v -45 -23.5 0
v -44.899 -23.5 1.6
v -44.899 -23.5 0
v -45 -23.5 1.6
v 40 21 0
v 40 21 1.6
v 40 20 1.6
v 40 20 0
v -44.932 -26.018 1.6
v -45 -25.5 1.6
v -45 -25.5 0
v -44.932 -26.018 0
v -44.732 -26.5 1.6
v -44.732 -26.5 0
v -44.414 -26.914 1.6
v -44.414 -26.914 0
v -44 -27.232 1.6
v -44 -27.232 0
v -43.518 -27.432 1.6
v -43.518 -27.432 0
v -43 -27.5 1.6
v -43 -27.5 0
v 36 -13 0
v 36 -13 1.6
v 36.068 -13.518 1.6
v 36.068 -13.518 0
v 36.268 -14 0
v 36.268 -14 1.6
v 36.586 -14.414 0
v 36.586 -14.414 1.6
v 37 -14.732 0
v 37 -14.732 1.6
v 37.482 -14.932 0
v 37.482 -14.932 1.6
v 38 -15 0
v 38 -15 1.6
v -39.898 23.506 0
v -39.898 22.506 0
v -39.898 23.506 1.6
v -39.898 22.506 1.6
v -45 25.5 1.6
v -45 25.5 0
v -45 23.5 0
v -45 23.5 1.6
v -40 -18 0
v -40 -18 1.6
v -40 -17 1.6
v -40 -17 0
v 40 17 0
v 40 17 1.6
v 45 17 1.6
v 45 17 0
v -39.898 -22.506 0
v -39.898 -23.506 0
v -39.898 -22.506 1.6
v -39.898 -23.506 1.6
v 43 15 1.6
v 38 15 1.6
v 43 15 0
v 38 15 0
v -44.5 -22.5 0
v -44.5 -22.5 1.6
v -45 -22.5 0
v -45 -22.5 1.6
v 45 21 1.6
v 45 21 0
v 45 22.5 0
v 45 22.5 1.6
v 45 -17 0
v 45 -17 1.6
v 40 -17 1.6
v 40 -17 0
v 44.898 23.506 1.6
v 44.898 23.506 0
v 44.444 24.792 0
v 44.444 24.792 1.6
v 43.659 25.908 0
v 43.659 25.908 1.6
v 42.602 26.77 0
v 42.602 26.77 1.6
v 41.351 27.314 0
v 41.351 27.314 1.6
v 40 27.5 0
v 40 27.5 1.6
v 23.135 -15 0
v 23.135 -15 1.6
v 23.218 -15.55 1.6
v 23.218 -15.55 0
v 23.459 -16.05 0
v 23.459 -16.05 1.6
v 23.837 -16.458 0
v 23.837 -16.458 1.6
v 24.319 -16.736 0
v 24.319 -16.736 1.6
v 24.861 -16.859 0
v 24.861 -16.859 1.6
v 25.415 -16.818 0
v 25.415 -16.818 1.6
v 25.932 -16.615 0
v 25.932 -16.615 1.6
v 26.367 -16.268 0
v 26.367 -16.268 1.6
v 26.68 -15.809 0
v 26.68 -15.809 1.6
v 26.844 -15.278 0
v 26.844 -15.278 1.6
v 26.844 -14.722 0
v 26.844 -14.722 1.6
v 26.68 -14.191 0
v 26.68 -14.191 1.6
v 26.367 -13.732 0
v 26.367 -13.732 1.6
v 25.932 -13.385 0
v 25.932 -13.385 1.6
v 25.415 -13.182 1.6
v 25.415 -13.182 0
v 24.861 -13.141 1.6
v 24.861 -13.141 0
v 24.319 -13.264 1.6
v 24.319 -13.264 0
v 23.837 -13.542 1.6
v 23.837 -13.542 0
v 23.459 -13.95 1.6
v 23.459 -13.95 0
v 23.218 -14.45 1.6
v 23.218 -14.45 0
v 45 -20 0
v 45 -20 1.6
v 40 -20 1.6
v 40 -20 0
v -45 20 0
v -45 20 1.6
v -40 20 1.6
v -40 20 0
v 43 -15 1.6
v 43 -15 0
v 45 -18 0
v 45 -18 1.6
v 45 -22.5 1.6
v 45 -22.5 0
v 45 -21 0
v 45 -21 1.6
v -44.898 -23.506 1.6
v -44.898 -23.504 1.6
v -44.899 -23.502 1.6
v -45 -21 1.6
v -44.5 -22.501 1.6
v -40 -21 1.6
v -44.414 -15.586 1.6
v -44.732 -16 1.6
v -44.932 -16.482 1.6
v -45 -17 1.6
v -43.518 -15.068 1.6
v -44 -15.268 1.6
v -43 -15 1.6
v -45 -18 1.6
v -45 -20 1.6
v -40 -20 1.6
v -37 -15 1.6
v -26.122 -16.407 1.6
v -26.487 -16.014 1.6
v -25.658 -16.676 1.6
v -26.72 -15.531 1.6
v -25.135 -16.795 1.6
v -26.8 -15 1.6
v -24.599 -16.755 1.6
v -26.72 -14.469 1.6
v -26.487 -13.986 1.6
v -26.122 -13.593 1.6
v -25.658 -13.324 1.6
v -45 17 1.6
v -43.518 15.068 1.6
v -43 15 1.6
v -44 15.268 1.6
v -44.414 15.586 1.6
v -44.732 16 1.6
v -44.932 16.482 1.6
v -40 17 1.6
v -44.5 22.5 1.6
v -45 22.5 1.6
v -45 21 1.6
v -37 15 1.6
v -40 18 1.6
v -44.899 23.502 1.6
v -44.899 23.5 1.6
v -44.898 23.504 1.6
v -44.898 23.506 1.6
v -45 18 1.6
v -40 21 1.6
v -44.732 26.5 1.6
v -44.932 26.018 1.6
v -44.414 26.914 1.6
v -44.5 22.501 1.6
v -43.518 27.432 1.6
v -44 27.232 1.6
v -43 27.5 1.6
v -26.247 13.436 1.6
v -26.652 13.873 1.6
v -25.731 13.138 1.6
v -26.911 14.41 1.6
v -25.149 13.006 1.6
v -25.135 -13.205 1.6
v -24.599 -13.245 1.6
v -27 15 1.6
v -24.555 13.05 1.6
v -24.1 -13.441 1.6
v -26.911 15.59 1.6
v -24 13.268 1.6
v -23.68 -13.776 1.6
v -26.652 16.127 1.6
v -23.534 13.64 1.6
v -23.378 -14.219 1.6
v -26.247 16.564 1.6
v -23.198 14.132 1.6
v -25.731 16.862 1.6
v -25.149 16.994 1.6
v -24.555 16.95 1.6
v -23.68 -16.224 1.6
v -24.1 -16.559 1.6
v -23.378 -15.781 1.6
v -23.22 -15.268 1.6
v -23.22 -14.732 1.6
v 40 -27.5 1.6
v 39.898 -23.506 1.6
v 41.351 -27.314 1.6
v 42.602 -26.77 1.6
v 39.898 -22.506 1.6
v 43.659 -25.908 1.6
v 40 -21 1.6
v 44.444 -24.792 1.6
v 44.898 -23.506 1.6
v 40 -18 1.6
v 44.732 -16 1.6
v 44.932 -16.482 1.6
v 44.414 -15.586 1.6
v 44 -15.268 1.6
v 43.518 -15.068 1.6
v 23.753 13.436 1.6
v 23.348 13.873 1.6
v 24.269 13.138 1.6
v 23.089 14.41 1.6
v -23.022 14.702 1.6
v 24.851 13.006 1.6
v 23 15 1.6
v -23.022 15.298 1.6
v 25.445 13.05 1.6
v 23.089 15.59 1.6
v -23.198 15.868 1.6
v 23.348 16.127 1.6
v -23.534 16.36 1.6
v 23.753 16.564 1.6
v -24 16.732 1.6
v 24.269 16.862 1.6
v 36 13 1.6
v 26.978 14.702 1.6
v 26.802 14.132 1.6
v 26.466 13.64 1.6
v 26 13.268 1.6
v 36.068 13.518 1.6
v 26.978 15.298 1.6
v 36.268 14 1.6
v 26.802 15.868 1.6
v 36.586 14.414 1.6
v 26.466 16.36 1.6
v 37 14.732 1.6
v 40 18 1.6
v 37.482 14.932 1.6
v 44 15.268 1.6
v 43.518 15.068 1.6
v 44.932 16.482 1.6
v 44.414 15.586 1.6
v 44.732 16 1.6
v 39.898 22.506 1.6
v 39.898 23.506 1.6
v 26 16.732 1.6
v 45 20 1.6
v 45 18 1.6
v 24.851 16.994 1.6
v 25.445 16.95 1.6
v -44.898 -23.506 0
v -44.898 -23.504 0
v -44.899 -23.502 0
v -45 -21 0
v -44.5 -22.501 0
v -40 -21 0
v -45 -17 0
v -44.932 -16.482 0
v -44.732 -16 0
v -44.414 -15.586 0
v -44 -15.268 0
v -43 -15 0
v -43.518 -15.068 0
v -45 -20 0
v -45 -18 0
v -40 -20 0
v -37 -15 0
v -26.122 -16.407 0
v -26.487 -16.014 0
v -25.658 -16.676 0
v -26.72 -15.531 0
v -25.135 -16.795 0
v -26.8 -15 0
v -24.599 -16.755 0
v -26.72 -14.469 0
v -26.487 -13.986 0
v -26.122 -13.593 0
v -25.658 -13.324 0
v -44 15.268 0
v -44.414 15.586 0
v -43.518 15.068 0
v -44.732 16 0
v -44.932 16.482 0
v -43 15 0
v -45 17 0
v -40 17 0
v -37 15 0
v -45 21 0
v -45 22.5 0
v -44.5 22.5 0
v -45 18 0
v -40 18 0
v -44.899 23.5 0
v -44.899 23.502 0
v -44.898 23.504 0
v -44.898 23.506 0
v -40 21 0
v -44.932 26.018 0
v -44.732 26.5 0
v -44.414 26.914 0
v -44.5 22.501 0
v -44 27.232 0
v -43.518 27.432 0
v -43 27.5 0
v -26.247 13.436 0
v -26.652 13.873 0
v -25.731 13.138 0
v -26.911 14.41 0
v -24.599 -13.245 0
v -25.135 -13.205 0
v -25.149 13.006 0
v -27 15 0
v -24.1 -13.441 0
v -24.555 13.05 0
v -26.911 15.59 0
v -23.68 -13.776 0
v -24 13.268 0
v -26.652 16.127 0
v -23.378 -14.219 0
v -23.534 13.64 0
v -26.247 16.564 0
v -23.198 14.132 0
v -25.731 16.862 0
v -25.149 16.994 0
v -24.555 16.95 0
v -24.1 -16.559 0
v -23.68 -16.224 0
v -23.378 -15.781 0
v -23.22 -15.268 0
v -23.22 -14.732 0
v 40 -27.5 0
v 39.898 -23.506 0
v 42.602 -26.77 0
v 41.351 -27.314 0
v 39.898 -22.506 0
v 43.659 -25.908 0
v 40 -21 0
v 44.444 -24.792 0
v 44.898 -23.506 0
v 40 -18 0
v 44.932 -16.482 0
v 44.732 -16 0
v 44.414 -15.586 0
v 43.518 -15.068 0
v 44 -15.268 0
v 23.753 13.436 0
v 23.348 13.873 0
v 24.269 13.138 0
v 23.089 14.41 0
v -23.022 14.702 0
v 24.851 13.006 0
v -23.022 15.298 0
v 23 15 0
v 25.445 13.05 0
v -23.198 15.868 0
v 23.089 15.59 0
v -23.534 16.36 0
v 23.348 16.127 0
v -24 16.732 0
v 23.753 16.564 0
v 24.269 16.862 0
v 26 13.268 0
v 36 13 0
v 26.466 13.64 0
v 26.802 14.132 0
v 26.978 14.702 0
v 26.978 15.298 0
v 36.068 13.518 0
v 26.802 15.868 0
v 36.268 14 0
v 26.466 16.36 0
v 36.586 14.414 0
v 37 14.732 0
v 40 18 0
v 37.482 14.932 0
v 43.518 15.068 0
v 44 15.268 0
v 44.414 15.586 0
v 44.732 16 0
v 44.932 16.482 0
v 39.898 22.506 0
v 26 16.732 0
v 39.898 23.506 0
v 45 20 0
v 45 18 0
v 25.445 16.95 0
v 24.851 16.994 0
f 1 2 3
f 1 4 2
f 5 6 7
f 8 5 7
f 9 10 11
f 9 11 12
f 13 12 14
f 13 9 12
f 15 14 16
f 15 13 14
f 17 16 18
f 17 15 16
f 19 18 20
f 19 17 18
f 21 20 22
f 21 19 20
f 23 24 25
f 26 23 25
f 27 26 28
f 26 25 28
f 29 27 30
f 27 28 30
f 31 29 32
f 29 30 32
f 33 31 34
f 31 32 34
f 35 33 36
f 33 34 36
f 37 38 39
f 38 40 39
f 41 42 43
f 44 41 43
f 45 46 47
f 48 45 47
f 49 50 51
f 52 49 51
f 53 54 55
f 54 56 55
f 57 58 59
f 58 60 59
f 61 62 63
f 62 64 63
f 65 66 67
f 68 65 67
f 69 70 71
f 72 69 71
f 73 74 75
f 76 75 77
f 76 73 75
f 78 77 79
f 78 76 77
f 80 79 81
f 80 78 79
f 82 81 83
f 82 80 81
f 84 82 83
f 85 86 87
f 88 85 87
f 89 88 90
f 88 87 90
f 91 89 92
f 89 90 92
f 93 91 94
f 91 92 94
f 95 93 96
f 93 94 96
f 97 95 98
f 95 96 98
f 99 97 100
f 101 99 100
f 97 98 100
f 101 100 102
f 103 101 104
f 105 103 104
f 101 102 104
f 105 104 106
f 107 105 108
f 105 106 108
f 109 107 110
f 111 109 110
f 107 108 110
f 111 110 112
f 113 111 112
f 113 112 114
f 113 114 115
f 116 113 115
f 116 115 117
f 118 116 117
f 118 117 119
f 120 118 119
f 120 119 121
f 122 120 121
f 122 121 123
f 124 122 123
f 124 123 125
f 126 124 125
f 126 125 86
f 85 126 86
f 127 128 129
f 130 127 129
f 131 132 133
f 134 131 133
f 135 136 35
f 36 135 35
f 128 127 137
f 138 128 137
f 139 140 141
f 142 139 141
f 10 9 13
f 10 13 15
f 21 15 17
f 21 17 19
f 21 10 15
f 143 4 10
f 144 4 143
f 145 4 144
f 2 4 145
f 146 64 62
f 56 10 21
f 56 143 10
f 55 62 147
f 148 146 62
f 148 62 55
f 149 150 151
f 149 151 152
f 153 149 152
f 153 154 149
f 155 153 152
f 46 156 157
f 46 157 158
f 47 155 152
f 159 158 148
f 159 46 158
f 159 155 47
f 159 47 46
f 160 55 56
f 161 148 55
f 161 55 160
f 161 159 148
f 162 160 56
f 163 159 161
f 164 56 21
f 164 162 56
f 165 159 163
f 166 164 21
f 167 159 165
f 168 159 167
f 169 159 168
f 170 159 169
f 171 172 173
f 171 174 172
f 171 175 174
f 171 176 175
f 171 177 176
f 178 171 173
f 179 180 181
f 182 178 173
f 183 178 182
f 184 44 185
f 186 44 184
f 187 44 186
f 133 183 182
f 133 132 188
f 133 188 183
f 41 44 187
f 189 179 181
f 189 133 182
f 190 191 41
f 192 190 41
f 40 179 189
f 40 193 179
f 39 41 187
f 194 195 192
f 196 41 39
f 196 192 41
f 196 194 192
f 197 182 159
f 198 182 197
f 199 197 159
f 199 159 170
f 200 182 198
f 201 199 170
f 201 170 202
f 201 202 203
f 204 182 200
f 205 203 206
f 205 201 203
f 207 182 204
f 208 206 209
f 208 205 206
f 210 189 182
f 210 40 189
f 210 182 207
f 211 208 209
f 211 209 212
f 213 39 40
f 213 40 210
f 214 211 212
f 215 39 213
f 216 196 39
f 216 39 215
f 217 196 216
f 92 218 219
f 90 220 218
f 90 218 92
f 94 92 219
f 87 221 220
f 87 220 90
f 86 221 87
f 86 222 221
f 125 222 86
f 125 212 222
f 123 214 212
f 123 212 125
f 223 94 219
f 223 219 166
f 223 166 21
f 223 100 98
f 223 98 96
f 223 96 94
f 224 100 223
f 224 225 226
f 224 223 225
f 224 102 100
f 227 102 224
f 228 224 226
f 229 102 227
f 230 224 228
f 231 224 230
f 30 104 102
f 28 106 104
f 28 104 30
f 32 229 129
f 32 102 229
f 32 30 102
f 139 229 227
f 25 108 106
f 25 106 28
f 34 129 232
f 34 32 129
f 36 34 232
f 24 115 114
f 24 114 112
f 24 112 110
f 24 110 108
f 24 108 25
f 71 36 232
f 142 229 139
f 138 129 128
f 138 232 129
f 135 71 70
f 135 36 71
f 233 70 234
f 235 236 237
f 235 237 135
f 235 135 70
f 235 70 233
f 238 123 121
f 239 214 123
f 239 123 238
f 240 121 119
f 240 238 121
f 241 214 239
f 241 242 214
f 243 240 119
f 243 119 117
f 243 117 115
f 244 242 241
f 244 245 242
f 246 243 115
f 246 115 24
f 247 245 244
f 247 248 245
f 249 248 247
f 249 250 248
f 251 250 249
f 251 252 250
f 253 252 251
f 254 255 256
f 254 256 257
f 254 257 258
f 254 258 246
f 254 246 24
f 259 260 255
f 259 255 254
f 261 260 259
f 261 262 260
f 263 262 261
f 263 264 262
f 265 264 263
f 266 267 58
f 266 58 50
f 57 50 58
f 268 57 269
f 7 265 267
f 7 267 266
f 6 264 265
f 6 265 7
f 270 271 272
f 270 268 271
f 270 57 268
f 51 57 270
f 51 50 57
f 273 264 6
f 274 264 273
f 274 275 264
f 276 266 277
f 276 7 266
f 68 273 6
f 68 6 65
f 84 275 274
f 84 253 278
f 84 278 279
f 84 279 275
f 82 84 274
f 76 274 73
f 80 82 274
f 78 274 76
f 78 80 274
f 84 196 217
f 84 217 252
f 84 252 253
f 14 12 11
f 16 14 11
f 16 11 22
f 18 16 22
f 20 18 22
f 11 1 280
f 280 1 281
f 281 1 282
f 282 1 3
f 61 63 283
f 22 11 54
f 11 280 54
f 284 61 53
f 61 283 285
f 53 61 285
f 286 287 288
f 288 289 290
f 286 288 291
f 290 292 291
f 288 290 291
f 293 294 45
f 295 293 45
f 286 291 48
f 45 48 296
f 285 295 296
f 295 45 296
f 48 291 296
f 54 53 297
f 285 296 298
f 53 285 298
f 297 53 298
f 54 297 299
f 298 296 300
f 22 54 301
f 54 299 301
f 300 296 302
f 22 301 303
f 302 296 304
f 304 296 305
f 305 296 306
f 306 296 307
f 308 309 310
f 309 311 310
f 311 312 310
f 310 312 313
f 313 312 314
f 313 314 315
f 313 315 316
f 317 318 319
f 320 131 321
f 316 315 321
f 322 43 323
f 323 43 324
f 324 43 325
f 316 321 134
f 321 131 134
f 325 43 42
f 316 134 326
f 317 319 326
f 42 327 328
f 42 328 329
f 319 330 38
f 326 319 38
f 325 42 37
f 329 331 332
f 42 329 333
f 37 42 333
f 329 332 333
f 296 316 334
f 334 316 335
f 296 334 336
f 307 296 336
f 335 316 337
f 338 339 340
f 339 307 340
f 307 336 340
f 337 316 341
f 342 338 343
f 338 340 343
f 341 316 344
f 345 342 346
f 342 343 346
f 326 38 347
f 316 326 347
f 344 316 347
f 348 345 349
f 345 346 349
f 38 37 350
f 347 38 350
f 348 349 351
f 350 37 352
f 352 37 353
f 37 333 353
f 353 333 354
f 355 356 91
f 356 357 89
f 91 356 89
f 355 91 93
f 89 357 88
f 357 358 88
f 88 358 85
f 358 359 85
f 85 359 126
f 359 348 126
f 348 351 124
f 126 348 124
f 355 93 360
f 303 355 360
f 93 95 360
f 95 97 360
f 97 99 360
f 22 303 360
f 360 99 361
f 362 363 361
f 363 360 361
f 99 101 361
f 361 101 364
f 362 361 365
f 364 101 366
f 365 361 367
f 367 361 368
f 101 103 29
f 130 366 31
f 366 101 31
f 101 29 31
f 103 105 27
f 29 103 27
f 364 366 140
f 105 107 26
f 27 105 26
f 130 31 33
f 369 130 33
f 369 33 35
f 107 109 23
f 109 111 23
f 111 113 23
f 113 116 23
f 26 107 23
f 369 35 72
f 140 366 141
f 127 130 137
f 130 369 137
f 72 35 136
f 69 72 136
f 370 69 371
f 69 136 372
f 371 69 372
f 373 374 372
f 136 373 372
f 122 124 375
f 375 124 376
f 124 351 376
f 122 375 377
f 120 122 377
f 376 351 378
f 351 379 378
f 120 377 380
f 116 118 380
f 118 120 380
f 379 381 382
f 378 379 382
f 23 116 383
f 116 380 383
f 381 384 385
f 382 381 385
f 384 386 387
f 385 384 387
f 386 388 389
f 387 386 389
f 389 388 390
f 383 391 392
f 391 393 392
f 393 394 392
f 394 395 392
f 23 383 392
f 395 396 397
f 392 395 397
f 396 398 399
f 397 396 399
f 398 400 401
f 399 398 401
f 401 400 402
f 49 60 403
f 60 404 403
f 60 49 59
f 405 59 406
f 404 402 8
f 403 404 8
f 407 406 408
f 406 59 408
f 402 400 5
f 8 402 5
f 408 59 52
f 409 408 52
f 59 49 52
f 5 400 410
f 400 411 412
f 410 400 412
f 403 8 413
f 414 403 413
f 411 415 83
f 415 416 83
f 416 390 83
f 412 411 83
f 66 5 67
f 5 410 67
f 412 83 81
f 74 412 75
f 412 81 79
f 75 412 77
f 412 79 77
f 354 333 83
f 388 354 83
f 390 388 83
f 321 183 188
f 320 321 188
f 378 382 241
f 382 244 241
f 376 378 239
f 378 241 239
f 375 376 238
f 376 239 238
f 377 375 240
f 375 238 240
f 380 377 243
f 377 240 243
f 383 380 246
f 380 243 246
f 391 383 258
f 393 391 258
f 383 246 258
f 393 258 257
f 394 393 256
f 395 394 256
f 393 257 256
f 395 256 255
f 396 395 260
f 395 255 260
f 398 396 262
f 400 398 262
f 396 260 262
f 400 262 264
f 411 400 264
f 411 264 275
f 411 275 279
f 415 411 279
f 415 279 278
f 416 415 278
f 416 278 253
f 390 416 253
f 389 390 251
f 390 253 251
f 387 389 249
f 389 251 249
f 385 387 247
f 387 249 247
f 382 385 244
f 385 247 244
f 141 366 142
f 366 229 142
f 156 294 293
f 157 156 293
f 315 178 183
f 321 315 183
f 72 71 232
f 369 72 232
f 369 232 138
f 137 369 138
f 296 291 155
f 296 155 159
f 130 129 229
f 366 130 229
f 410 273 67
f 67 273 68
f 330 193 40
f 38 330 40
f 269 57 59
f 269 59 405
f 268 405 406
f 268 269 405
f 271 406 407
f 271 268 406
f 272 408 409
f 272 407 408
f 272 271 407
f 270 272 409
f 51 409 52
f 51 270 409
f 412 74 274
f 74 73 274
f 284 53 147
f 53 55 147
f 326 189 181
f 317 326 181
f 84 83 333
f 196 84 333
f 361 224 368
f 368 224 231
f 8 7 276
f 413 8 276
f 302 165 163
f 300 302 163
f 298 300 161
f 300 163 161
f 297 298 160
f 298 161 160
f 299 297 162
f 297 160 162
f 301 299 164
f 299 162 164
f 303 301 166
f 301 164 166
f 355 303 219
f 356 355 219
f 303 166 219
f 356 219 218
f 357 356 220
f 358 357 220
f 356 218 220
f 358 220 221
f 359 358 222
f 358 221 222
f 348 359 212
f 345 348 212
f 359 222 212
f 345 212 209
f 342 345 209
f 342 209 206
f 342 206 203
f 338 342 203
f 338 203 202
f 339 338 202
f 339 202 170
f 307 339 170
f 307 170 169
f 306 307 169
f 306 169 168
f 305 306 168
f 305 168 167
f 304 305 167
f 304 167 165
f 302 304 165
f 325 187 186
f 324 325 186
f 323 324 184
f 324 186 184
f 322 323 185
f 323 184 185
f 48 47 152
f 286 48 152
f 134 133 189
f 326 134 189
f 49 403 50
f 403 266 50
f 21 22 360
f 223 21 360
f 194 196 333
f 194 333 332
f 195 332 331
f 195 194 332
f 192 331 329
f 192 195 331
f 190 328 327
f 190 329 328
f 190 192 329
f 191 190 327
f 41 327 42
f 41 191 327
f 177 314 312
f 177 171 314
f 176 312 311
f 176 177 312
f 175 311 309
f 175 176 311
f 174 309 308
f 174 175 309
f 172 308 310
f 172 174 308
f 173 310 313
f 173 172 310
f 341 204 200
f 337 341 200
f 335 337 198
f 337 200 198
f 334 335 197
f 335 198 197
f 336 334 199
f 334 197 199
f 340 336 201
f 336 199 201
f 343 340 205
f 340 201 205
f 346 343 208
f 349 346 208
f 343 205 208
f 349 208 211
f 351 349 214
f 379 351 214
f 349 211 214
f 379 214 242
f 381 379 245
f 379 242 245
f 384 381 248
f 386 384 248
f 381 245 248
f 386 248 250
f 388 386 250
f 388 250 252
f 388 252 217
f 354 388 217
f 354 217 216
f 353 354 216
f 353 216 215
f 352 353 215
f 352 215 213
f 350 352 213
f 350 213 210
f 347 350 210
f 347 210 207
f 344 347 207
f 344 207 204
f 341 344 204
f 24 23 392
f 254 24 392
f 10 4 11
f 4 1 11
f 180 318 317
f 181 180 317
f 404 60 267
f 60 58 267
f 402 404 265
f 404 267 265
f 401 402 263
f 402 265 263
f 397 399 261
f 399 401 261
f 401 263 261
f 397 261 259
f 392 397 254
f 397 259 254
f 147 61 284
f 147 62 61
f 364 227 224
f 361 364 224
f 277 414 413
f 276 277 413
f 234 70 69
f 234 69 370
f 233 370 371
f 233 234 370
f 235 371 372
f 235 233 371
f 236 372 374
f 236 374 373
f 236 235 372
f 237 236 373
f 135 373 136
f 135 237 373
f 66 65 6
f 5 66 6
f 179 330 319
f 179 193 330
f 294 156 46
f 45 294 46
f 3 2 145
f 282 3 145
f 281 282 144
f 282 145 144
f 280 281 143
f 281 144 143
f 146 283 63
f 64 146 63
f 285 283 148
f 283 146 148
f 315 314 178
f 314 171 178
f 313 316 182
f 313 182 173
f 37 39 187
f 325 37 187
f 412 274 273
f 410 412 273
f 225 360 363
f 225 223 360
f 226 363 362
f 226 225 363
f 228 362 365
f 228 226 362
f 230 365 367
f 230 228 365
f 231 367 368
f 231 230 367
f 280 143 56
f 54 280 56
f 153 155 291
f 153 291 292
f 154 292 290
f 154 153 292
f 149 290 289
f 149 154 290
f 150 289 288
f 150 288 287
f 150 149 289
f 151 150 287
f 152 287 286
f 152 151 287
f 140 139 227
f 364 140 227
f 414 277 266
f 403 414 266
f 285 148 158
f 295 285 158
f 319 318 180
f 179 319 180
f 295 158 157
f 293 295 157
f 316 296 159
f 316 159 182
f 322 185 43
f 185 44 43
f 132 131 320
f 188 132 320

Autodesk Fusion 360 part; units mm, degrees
sketch "Sketch1" plane through (0, 0, 0) normal (0, 0, 1) x (1, 0, 0)
  line L0 (45, 27.5) -> (-45, 27.5)
  line L1 (-45, 27.5) -> (-45, -27.5)
  line L2 (-45, -27.5) -> (45, -27.5)
  line L3 (45, -27.5) -> (45, 27.5)
  line L4 (45, 27.5) -> (-45, -27.5) construction
  line L5 (-45, 27.5) -> (45, -27.5) construction
  dimension "d1" = 90
  dimension "d2" = 55
extrude "Extrude1" add sketch "Sketch1" along normal blind 1.6
fillet "Fillet1" radius 5 2 edges at (45, -27.5, 0.8) (45, 27.5, 0.8)
sketch "Sketch2" plane through (0, 0, 1.6) normal (0, 0, 1) x (-1, 0, 0)
  line L0 (45, -27.5) -> (45, 27.5)
  line L1 (45, 27.5) -> (-40, 27.5)
  arc A0 (-40, 27.5) -> (-45, 22.5) centre (-40, 22.5) ccw
  line L2 (-45, 22.5) -> (-45, -22.5)
  arc A1 (-45, -22.5) -> (-40, -27.5) centre (-40, -22.5) ccw
  line L3 (-40, -27.5) -> (45, -27.5)
  line L4 (25, 15) -> (-25, 15) construction
  line L5 (-25, 15) -> (-25, -15)
  line L6 (-25, -15) -> (25, -15) construction
  line L7 (25, -15) -> (25, 15)
  line L8 (25, 15) -> (-25, -15) construction
  line L9 (-25, 15) -> (25, -15) construction
  circle A2 centre (25, -15) radius 2
  circle A3 centre (25, 15) radius 1.8001
  circle A4 centre (-25, 15) radius 1.8646
  circle A5 centre (-25, -15) radius 2
  dimension "d10" = 50
  dimension "d11" = 30
extrude "Extrude2" cut sketch "Sketch2" against normal blind 4 contours A5 | A4 | A3 | A2
sketch "Sketch3" plane through (0, 0, 0) normal (0, 0, -1) x (1, 0, 0)
  circle A0 centre (25, -15) radius 2
  circle A1 centre (25, 15) radius 1.8646
  circle A2 centre (-25, -15) radius 2
  circle A3 centre (-25, 15) radius 1.8001
  line L0 (-45, -27.5) -> (40, -27.5)
  arc A4 (40, -27.5) -> (45, -22.5) centre (40, -22.5) ccw
  line L1 (45, -22.5) -> (45, 22.5)
  arc A5 (45, 22.5) -> (40, 27.5) centre (40, 22.5) ccw
  line L2 (40, 27.5) -> (-45, 27.5)
  line L3 (-45, 27.5) -> (-45, -27.5)
  line L4 (-45, 15) -> (-37, 15)
  line L5 (-37, 15) -> (-37, -15)
  line L6 (-37, -15) -> (-45, -15)
  line L7 (-45, -15) -> (-45, 15)
extrude "Extrude3" cut sketch "Sketch3" against normal blind 3 contours L3 L4 L5 L6 L7
sketch "Sketch4" plane through (0, 0, 0) normal (0, 0, -1) x (1, 0, 0)
  line L0 (-37, -15) -> (-45, -15)
  line L1 (-45, -27.5) -> (40, -27.5)
  arc A0 (40, -27.5) -> (45, -22.5) centre (40, -22.5) ccw
  line L2 (45, -22.5) -> (45, 22.5)
  arc A1 (45, 22.5) -> (40, 27.5) centre (40, 22.5) ccw
  line L3 (40, 27.5) -> (-45, 27.5)
  line L4 (-45, 15) -> (-37, 15)
  line L5 (-37, 15) -> (-37, -15)
  circle A2 centre (25, -15) radius 2
  circle A3 centre (25, 15) radius 1.8646
  circle A4 centre (-25, -15) radius 2
  circle A5 centre (-25, 15) radius 1.8001
  line L6 (45, 15) -> (36, 15)
  line L7 (36, 15) -> (36, -15)
  line L8 (36, -15) -> (45, -15)
  line L9 (45, -15) -> (45, 15)
  line L10 (-45, -15) -> (-45, -27.5)
  line L11 (-45, 27.5) -> (-45, 15)
extrude "Extrude4" cut sketch "Sketch4" against normal blind 6 contours L2 L6 L7 L8 L9
sketch "Sketch5" plane through (0, 0, 1.6) normal (0, 0, 1) x (-1, 0, 0)
  circle A0 centre (25, 15) radius 1.8001
  circle A1 centre (25, -15) radius 2
  circle A2 centre (-25, 15) radius 1.8646
  circle A3 centre (-25, -15) radius 2
  line L0 (45, -15) -> (37, -15)
  line L1 (37, -15) -> (37, 15)
  line L2 (37, 15) -> (45, 15)
  line L3 (45, 27.5) -> (-40, 27.5)
  arc A4 (-40, 27.5) -> (-45, 22.5) centre (-40, 22.5) ccw
  line L4 (-45, -15) -> (-45, -22.5)
  line L5 (-45, 15) -> (-36, 15)
  line L6 (-36, 15) -> (-36, -15)
  line L7 (-36, -15) -> (-45, -15)
  arc A5 (-45, -22.5) -> (-40, -27.5) centre (-40, -22.5) ccw
  line L8 (-40, -27.5) -> (45, -27.5)
  line L9 (-44.8978, -23.5058) -> (-39.8978, -23.5058)
  line L10 (-39.8978, -23.5058) -> (-39.8978, -22.5058)
  line L11 (-39.8978, -22.5058) -> (-45, -22.5)
  line L12 (-45, -21) -> (-40, -21)
  line L13 (-40, -21) -> (-40, -20)
  line L14 (-40, -20) -> (-45, -20)
  line L15 (-45, -18) -> (-40, -18)
  line L16 (-40, -18) -> (-40, -17)
  line L17 (-40, -17) -> (-45, -17)
  line L18 (45, -27.5) -> (45, -15)
  line L19 (45, 15) -> (45, 27.5)
  line L20 (-45, 22.5) -> (-45, 15)
  dimension "d20" = 5
  dimension "d21" = 1
  dimension "d22" = 1
  dimension "d23" = 1
extrude "Extrude5" cut sketch "Sketch5" against normal blind 3 contours A5 L9 L10 L11 | L4 L12 L13 L14 | L4 L15 L16 L17
mirror "Mirror1" about plane through (0, 0, 0) normal (0, 1, 0) of "Extrude5"
sketch "Sketch6" plane through (0, 0, 1.6) normal (0, 0, 1) x (-1, 0, 0)
  circle A0 centre (-25, -15) radius 2
  circle A1 centre (-25, 15) radius 1.8646
  circle A2 centre (25, -15) radius 2
  circle A3 centre (25, 15) radius 1.8001
  line L0 (-44.8978, 23.5058) -> (-39.8978, 23.5058)
  line L1 (-39.8978, 23.5058) -> (-39.8978, 22.5058)
  line L2 (-39.8978, 22.5058) -> (-45, 22.5)
  line L3 (-45, 22.5) -> (-45, 21)
  line L4 (-45, 21) -> (-40, 21)
  line L5 (-40, 21) -> (-40, 20)
  line L6 (-40, 20) -> (-45, 20)
  line L7 (-45, 20) -> (-45, 18)
  line L8 (-45, 18) -> (-40, 18)
  line L9 (-40, 18) -> (-40, 17)
  line L10 (-40, 17) -> (-45, 17)
  line L11 (-45, 15) -> (-36, 15)
  line L12 (-36, 15) -> (-36, -15)
  line L13 (-36, -15) -> (-45, -15)
  line L14 (-45, -17) -> (-40, -17)
  line L15 (-40, -17) -> (-40, -18)
  line L16 (-40, -18) -> (-45, -18)
  line L17 (-45, -18) -> (-45, -20)
  line L18 (-45, -20) -> (-40, -20)
  line L19 (-40, -20) -> (-40, -21)
  line L20 (-40, -21) -> (-45, -21)
  line L21 (-45, -21) -> (-45, -22.5)
  line L22 (-45, -22.5) -> (-39.8978, -22.5058)
  line L23 (-39.8978, -22.5058) -> (-39.8978, -23.5058)
  line L24 (-39.8978, -23.5058) -> (-44.8978, -23.5058)
  arc A4 (-44.8978, -23.5058) -> (-40, -27.5) centre (-40, -22.5) ccw
  line L25 (-40, -27.5) -> (45, -27.5)
  line L26 (45, -15) -> (37, -15)
  line L27 (37, -15) -> (37, 15)
  line L28 (37, 15) -> (45, 15)
  line L29 (45, 27.5) -> (-40, 27.5)
  arc A5 (-40, 27.5) -> (-44.8978, 23.5058) centre (-40, 22.5) ccw
  line L30 (45, -27.5) -> (45, -15)
  line L31 (45, 15) -> (45, 27.5)
  line L32 (-45, 17) -> (-45, 15)
  line L33 (-45, -15) -> (-45, -17)
mirror "Mirror2" about plane through (0, 0, 0) normal (1, 0, 0) of "Extrude5"
mirror "Mirror3" about plane through (0, 0, 0) normal (1, 0, 0) of "Mirror1"
sketch "Sketch7" plane through (-45, 0, 0) normal (-1, 0, 0) x (0, -1, 0)
  line L0 (22.5, 1.6) -> (22.5, 0)
  line L1 (22.5, 0) -> (27.5, 0)
  line L2 (27.5, 0) -> (27.5, 1.6)
  line L3 (27.5, 1.6) -> (22.5, 1.6)
  line L4 (22.5, 1.6) -> (23.5, 1.6)
  line L5 (23.5, 1.6) -> (23.5, 0)
  line L6 (23.5, 0) -> (22.5, 0)
  line L7 (22.5, 0) -> (22.5, 1.6)
extrude "Extrude6" cut sketch "Sketch7" against normal blind 0.5 contours L0 L1 L3 L4 L5 L6 L7
sketch "Sketch8" plane through (-45, 0, 0) normal (-1, 0, 0) x (0, -1, 0)
  line L0 (-22.5, 0) -> (-22.5, 1.6)
  line L1 (-22.5, 1.6) -> (-27.5, 1.6)
  line L2 (-27.5, 1.6) -> (-27.5, 0)
  line L3 (-27.5, 0) -> (-22.5, 0)
  line L4 (-22.5, 1.6) -> (-23.5, 1.6)
  line L5 (-23.5, 1.6) -> (-23.5, 0)
  line L6 (-23.5, 0) -> (-22.5, 0)
  line L7 (-22.5, 0) -> (-22.5, 1.6)
extrude "Extrude7" cut sketch "Sketch8" against normal blind 0.5 contours L0 L1 L3 L4 L5 L6 L7
fillet "Fillet4" radius 2 2 edges at (-45, 27.5, 0.8) (-45, 15, 0.8)
fillet "Fillet5" radius 2 2 edges at (-45, -15, 0.8) (-45, -27.5, 0.8)
fillet "Fillet6" radius 2 4 edges at (45, -15, 0.8) (36, -15, 0.8) (45, 15, 0.8) (36, 15, 0.8)
sketch "Sketch9" plane through (0, 0, 0) normal (0, 0, -1) x (1, 0, 0)
  arc A0 (45, -17) -> (43, -15) centre (43, -17) ccw
  line L0 (43, -15) -> (38, -15)
  arc A1 (36, -13) -> (38, -15) centre (38, -13) ccw
  line L1 (36, -13) -> (36, 13)
  arc A2 (38, 15) -> (36, 13) centre (38, 13) ccw
  line L2 (38, 15) -> (43, 15)
  arc A3 (43, 15) -> (45, 17) centre (43, 17) ccw
  line L3 (45, 17) -> (40, 17)
  line L4 (40, 17) -> (40, 18)
  line L5 (40, 18) -> (45, 18)
  line L6 (45, 18) -> (45, 20)
  line L7 (45, 20) -> (40, 20)
  line L8 (40, 20) -> (40, 21)
  line L9 (40, 21) -> (45, 21)
  line L10 (45, 21) -> (45, 22.5)
  line L11 (45, 22.5) -> (39.8978, 22.5058)
  line L12 (39.8978, 22.5058) -> (39.8978, 23.5058)
  line L13 (39.8978, 23.5058) -> (44.8978, 23.5058)
  arc A4 (44.8978, 23.5058) -> (40, 27.5) centre (40, 22.5) ccw
  line L14 (40, 27.5) -> (-43, 27.5)
  arc A5 (-43, 27.5) -> (-45, 25.5) centre (-43, 25.5) ccw
  line L15 (-45, 25.5) -> (-45, 23.5)
  line L16 (-45, 23.5) -> (-44.899, 23.5)
  arc A6 (-44.8978, 23.5058) -> (-44.899, 23.5) centre (-40, 22.5) ccw
  line L17 (-44.8978, 23.5058) -> (-39.8978, 23.5058)
  line L18 (-39.8978, 23.5058) -> (-39.8978, 22.5058)
  line L19 (-39.8978, 22.5058) -> (-44.5, 22.5006)
  line L20 (-44.5, 22.5006) -> (-44.5, 22.5)
  line L21 (-44.5, 22.5) -> (-45, 22.5)
  line L22 (-45, 22.5) -> (-45, 21)
  line L23 (-45, 21) -> (-40, 21)
  line L24 (-40, 21) -> (-40, 20)
  line L25 (-40, 20) -> (-45, 20)
  line L26 (-45, 20) -> (-45, 18)
  line L27 (-45, 18) -> (-40, 18)
  line L28 (-40, 18) -> (-40, 17)
  line L29 (-40, 17) -> (-45, 17)
  arc A7 (-45, 17) -> (-43, 15) centre (-43, 17) ccw
  line L30 (-43, 15) -> (-37, 15)
  line L31 (-37, 15) -> (-37, -15)
  line L32 (-37, -15) -> (-43, -15)
  arc A8 (-43, -15) -> (-45, -17) centre (-43, -17) ccw
  line L33 (-45, -17) -> (-40, -17)
  line L34 (-40, -17) -> (-40, -18)
  line L35 (-40, -18) -> (-45, -18)
  line L36 (-45, -18) -> (-45, -20)
  line L37 (-45, -20) -> (-40, -20)
  line L38 (-40, -20) -> (-40, -21)
  line L39 (-40, -21) -> (-45, -21)
  line L40 (-45, -21) -> (-45, -22.5)
  line L41 (-45, -22.5) -> (-44.5, -22.5)
  line L42 (-44.5, -22.5) -> (-44.5, -22.5006)
  line L43 (-44.5, -22.5006) -> (-39.8978, -22.5058)
  line L44 (-39.8978, -22.5058) -> (-39.8978, -23.5058)
  line L45 (-39.8978, -23.5058) -> (-44.8978, -23.5058)
  arc A9 (-44.899, -23.5) -> (-44.8978, -23.5058) centre (-40, -22.5) ccw
  line L46 (-44.899, -23.5) -> (-45, -23.5)
  line L47 (-45, -23.5) -> (-45, -25.5)
  arc A10 (-45, -25.5) -> (-43, -27.5) centre (-43, -25.5) ccw
  line L48 (-43, -27.5) -> (40, -27.5)
  arc A11 (40, -27.5) -> (44.8978, -23.5058) centre (40, -22.5) ccw
  line L49 (44.8978, -23.5058) -> (39.8978, -23.5058)
  line L50 (39.8978, -23.5058) -> (39.8978, -22.5058)
  line L51 (39.8978, -22.5058) -> (45, -22.5)
  line L52 (45, -22.5) -> (45, -21)
  line L53 (45, -21) -> (40, -21)
  line L54 (40, -21) -> (40, -20)
  line L55 (40, -20) -> (45, -20)
  line L56 (45, -20) -> (45, -18)
  line L57 (45, -18) -> (40, -18)
  line L58 (40, -18) -> (40, -17)
  line L59 (40, -17) -> (45, -17)
  circle A12 centre (25, -15) radius 2
  circle A13 centre (25, 15) radius 1.8646
  circle A14 centre (-25, -15) radius 2
  circle A15 centre (-25, 15) radius 1.8001
sketch "Sketch10" plane through (0, 0, 1.6) normal (0, 0, 1) x (-1, 0, 0)
  circle A0 centre (25, 15) radius 1.8001
  circle A1 centre (25, -15) radius 2
  circle A2 centre (-25, 15) radius 1.8646
  circle A3 centre (-25, -15) radius 2
  arc A4 (-43, -15) -> (-45, -17) centre (-43, -17) ccw
  line L0 (-45, -17) -> (-40, -17)
  line L1 (-40, -17) -> (-40, -18)
  line L2 (-40, -18) -> (-45, -18)
  line L3 (-45, -18) -> (-45, -20)
  line L4 (-45, -20) -> (-40, -20)
  line L5 (-40, -20) -> (-40, -21)
  line L6 (-40, -21) -> (-45, -21)
  line L7 (-45, -21) -> (-45, -22.5)
  line L8 (-45, -22.5) -> (-39.8978, -22.5058)
  line L9 (-39.8978, -22.5058) -> (-39.8978, -23.5058)
  line L10 (-39.8978, -23.5058) -> (-44.8978, -23.5058)
  arc A5 (-44.8978, -23.5058) -> (-40, -27.5) centre (-40, -22.5) ccw
  line L11 (-40, -27.5) -> (43, -27.5)
  arc A6 (43, -27.5) -> (45, -25.5) centre (43, -25.5) ccw
  line L12 (45, -25.5) -> (45, -23.5)
  line L13 (45, -23.5) -> (44.899, -23.5)
  arc A7 (44.8978, -23.5058) -> (44.899, -23.5) centre (40, -22.5) ccw
  line L14 (44.8978, -23.5058) -> (39.8978, -23.5058)
  line L15 (39.8978, -23.5058) -> (39.8978, -22.5058)
  line L16 (39.8978, -22.5058) -> (44.5, -22.5006)
  line L17 (44.5, -22.5006) -> (44.5, -22.5)
  line L18 (44.5, -22.5) -> (45, -22.5)
  line L19 (45, -22.5) -> (45, -21)
  line L20 (45, -21) -> (40, -21)
  line L21 (40, -21) -> (40, -20)
  line L22 (40, -20) -> (45, -20)
  line L23 (45, -20) -> (45, -18)
  line L24 (45, -18) -> (40, -18)
  line L25 (40, -18) -> (40, -17)
  line L26 (40, -17) -> (45, -17)
  arc A8 (45, -17) -> (43, -15) centre (43, -17) ccw
  line L27 (43, -15) -> (37, -15)
  line L28 (37, -15) -> (37, 15)
  line L29 (37, 15) -> (43, 15)
  arc A9 (43, 15) -> (45, 17) centre (43, 17) ccw
  line L30 (45, 17) -> (40, 17)
  line L31 (40, 17) -> (40, 18)
  line L32 (40, 18) -> (45, 18)
  line L33 (45, 18) -> (45, 20)
  line L34 (45, 20) -> (40, 20)
  line L35 (40, 20) -> (40, 21)
  line L36 (40, 21) -> (45, 21)
  line L37 (45, 21) -> (45, 22.5)
  line L38 (45, 22.5) -> (44.5, 22.5)
  line L39 (44.5, 22.5) -> (44.5, 22.5006)
  line L40 (44.5, 22.5006) -> (39.8978, 22.5058)
  line L41 (39.8978, 22.5058) -> (39.8978, 23.5058)
  line L42 (39.8978, 23.5058) -> (44.8978, 23.5058)
  arc A10 (44.899, 23.5) -> (44.8978, 23.5058) centre (40, 22.5) ccw
  line L43 (44.899, 23.5) -> (45, 23.5)
  line L44 (45, 23.5) -> (45, 25.5)
  arc A11 (45, 25.5) -> (43, 27.5) centre (43, 25.5) ccw
  line L45 (43, 27.5) -> (-40, 27.5)
  arc A12 (-40, 27.5) -> (-44.8978, 23.5058) centre (-40, 22.5) ccw
  line L46 (-44.8978, 23.5058) -> (-39.8978, 23.5058)
  line L47 (-39.8978, 23.5058) -> (-39.8978, 22.5058)
  line L48 (-39.8978, 22.5058) -> (-45, 22.5)
  line L49 (-45, 22.5) -> (-45, 21)
  line L50 (-45, 21) -> (-40, 21)
  line L51 (-40, 21) -> (-40, 20)
  line L52 (-40, 20) -> (-45, 20)
  line L53 (-45, 20) -> (-45, 18)
  line L54 (-45, 18) -> (-40, 18)
  line L55 (-40, 18) -> (-40, 17)
  line L56 (-40, 17) -> (-45, 17)
  arc A13 (-45, 17) -> (-43, 15) centre (-43, 17) ccw
  line L57 (-43, 15) -> (-38, 15)
  arc A14 (-36, 13) -> (-38, 15) centre (-38, 13) ccw
  line L58 (-36, 13) -> (-36, -13)
  arc A15 (-38, -15) -> (-36, -13) centre (-38, -13) ccw
  line L59 (-38, -15) -> (-43, -15)
  line L60 (43, -27.5) -> (-40, -27.5)
